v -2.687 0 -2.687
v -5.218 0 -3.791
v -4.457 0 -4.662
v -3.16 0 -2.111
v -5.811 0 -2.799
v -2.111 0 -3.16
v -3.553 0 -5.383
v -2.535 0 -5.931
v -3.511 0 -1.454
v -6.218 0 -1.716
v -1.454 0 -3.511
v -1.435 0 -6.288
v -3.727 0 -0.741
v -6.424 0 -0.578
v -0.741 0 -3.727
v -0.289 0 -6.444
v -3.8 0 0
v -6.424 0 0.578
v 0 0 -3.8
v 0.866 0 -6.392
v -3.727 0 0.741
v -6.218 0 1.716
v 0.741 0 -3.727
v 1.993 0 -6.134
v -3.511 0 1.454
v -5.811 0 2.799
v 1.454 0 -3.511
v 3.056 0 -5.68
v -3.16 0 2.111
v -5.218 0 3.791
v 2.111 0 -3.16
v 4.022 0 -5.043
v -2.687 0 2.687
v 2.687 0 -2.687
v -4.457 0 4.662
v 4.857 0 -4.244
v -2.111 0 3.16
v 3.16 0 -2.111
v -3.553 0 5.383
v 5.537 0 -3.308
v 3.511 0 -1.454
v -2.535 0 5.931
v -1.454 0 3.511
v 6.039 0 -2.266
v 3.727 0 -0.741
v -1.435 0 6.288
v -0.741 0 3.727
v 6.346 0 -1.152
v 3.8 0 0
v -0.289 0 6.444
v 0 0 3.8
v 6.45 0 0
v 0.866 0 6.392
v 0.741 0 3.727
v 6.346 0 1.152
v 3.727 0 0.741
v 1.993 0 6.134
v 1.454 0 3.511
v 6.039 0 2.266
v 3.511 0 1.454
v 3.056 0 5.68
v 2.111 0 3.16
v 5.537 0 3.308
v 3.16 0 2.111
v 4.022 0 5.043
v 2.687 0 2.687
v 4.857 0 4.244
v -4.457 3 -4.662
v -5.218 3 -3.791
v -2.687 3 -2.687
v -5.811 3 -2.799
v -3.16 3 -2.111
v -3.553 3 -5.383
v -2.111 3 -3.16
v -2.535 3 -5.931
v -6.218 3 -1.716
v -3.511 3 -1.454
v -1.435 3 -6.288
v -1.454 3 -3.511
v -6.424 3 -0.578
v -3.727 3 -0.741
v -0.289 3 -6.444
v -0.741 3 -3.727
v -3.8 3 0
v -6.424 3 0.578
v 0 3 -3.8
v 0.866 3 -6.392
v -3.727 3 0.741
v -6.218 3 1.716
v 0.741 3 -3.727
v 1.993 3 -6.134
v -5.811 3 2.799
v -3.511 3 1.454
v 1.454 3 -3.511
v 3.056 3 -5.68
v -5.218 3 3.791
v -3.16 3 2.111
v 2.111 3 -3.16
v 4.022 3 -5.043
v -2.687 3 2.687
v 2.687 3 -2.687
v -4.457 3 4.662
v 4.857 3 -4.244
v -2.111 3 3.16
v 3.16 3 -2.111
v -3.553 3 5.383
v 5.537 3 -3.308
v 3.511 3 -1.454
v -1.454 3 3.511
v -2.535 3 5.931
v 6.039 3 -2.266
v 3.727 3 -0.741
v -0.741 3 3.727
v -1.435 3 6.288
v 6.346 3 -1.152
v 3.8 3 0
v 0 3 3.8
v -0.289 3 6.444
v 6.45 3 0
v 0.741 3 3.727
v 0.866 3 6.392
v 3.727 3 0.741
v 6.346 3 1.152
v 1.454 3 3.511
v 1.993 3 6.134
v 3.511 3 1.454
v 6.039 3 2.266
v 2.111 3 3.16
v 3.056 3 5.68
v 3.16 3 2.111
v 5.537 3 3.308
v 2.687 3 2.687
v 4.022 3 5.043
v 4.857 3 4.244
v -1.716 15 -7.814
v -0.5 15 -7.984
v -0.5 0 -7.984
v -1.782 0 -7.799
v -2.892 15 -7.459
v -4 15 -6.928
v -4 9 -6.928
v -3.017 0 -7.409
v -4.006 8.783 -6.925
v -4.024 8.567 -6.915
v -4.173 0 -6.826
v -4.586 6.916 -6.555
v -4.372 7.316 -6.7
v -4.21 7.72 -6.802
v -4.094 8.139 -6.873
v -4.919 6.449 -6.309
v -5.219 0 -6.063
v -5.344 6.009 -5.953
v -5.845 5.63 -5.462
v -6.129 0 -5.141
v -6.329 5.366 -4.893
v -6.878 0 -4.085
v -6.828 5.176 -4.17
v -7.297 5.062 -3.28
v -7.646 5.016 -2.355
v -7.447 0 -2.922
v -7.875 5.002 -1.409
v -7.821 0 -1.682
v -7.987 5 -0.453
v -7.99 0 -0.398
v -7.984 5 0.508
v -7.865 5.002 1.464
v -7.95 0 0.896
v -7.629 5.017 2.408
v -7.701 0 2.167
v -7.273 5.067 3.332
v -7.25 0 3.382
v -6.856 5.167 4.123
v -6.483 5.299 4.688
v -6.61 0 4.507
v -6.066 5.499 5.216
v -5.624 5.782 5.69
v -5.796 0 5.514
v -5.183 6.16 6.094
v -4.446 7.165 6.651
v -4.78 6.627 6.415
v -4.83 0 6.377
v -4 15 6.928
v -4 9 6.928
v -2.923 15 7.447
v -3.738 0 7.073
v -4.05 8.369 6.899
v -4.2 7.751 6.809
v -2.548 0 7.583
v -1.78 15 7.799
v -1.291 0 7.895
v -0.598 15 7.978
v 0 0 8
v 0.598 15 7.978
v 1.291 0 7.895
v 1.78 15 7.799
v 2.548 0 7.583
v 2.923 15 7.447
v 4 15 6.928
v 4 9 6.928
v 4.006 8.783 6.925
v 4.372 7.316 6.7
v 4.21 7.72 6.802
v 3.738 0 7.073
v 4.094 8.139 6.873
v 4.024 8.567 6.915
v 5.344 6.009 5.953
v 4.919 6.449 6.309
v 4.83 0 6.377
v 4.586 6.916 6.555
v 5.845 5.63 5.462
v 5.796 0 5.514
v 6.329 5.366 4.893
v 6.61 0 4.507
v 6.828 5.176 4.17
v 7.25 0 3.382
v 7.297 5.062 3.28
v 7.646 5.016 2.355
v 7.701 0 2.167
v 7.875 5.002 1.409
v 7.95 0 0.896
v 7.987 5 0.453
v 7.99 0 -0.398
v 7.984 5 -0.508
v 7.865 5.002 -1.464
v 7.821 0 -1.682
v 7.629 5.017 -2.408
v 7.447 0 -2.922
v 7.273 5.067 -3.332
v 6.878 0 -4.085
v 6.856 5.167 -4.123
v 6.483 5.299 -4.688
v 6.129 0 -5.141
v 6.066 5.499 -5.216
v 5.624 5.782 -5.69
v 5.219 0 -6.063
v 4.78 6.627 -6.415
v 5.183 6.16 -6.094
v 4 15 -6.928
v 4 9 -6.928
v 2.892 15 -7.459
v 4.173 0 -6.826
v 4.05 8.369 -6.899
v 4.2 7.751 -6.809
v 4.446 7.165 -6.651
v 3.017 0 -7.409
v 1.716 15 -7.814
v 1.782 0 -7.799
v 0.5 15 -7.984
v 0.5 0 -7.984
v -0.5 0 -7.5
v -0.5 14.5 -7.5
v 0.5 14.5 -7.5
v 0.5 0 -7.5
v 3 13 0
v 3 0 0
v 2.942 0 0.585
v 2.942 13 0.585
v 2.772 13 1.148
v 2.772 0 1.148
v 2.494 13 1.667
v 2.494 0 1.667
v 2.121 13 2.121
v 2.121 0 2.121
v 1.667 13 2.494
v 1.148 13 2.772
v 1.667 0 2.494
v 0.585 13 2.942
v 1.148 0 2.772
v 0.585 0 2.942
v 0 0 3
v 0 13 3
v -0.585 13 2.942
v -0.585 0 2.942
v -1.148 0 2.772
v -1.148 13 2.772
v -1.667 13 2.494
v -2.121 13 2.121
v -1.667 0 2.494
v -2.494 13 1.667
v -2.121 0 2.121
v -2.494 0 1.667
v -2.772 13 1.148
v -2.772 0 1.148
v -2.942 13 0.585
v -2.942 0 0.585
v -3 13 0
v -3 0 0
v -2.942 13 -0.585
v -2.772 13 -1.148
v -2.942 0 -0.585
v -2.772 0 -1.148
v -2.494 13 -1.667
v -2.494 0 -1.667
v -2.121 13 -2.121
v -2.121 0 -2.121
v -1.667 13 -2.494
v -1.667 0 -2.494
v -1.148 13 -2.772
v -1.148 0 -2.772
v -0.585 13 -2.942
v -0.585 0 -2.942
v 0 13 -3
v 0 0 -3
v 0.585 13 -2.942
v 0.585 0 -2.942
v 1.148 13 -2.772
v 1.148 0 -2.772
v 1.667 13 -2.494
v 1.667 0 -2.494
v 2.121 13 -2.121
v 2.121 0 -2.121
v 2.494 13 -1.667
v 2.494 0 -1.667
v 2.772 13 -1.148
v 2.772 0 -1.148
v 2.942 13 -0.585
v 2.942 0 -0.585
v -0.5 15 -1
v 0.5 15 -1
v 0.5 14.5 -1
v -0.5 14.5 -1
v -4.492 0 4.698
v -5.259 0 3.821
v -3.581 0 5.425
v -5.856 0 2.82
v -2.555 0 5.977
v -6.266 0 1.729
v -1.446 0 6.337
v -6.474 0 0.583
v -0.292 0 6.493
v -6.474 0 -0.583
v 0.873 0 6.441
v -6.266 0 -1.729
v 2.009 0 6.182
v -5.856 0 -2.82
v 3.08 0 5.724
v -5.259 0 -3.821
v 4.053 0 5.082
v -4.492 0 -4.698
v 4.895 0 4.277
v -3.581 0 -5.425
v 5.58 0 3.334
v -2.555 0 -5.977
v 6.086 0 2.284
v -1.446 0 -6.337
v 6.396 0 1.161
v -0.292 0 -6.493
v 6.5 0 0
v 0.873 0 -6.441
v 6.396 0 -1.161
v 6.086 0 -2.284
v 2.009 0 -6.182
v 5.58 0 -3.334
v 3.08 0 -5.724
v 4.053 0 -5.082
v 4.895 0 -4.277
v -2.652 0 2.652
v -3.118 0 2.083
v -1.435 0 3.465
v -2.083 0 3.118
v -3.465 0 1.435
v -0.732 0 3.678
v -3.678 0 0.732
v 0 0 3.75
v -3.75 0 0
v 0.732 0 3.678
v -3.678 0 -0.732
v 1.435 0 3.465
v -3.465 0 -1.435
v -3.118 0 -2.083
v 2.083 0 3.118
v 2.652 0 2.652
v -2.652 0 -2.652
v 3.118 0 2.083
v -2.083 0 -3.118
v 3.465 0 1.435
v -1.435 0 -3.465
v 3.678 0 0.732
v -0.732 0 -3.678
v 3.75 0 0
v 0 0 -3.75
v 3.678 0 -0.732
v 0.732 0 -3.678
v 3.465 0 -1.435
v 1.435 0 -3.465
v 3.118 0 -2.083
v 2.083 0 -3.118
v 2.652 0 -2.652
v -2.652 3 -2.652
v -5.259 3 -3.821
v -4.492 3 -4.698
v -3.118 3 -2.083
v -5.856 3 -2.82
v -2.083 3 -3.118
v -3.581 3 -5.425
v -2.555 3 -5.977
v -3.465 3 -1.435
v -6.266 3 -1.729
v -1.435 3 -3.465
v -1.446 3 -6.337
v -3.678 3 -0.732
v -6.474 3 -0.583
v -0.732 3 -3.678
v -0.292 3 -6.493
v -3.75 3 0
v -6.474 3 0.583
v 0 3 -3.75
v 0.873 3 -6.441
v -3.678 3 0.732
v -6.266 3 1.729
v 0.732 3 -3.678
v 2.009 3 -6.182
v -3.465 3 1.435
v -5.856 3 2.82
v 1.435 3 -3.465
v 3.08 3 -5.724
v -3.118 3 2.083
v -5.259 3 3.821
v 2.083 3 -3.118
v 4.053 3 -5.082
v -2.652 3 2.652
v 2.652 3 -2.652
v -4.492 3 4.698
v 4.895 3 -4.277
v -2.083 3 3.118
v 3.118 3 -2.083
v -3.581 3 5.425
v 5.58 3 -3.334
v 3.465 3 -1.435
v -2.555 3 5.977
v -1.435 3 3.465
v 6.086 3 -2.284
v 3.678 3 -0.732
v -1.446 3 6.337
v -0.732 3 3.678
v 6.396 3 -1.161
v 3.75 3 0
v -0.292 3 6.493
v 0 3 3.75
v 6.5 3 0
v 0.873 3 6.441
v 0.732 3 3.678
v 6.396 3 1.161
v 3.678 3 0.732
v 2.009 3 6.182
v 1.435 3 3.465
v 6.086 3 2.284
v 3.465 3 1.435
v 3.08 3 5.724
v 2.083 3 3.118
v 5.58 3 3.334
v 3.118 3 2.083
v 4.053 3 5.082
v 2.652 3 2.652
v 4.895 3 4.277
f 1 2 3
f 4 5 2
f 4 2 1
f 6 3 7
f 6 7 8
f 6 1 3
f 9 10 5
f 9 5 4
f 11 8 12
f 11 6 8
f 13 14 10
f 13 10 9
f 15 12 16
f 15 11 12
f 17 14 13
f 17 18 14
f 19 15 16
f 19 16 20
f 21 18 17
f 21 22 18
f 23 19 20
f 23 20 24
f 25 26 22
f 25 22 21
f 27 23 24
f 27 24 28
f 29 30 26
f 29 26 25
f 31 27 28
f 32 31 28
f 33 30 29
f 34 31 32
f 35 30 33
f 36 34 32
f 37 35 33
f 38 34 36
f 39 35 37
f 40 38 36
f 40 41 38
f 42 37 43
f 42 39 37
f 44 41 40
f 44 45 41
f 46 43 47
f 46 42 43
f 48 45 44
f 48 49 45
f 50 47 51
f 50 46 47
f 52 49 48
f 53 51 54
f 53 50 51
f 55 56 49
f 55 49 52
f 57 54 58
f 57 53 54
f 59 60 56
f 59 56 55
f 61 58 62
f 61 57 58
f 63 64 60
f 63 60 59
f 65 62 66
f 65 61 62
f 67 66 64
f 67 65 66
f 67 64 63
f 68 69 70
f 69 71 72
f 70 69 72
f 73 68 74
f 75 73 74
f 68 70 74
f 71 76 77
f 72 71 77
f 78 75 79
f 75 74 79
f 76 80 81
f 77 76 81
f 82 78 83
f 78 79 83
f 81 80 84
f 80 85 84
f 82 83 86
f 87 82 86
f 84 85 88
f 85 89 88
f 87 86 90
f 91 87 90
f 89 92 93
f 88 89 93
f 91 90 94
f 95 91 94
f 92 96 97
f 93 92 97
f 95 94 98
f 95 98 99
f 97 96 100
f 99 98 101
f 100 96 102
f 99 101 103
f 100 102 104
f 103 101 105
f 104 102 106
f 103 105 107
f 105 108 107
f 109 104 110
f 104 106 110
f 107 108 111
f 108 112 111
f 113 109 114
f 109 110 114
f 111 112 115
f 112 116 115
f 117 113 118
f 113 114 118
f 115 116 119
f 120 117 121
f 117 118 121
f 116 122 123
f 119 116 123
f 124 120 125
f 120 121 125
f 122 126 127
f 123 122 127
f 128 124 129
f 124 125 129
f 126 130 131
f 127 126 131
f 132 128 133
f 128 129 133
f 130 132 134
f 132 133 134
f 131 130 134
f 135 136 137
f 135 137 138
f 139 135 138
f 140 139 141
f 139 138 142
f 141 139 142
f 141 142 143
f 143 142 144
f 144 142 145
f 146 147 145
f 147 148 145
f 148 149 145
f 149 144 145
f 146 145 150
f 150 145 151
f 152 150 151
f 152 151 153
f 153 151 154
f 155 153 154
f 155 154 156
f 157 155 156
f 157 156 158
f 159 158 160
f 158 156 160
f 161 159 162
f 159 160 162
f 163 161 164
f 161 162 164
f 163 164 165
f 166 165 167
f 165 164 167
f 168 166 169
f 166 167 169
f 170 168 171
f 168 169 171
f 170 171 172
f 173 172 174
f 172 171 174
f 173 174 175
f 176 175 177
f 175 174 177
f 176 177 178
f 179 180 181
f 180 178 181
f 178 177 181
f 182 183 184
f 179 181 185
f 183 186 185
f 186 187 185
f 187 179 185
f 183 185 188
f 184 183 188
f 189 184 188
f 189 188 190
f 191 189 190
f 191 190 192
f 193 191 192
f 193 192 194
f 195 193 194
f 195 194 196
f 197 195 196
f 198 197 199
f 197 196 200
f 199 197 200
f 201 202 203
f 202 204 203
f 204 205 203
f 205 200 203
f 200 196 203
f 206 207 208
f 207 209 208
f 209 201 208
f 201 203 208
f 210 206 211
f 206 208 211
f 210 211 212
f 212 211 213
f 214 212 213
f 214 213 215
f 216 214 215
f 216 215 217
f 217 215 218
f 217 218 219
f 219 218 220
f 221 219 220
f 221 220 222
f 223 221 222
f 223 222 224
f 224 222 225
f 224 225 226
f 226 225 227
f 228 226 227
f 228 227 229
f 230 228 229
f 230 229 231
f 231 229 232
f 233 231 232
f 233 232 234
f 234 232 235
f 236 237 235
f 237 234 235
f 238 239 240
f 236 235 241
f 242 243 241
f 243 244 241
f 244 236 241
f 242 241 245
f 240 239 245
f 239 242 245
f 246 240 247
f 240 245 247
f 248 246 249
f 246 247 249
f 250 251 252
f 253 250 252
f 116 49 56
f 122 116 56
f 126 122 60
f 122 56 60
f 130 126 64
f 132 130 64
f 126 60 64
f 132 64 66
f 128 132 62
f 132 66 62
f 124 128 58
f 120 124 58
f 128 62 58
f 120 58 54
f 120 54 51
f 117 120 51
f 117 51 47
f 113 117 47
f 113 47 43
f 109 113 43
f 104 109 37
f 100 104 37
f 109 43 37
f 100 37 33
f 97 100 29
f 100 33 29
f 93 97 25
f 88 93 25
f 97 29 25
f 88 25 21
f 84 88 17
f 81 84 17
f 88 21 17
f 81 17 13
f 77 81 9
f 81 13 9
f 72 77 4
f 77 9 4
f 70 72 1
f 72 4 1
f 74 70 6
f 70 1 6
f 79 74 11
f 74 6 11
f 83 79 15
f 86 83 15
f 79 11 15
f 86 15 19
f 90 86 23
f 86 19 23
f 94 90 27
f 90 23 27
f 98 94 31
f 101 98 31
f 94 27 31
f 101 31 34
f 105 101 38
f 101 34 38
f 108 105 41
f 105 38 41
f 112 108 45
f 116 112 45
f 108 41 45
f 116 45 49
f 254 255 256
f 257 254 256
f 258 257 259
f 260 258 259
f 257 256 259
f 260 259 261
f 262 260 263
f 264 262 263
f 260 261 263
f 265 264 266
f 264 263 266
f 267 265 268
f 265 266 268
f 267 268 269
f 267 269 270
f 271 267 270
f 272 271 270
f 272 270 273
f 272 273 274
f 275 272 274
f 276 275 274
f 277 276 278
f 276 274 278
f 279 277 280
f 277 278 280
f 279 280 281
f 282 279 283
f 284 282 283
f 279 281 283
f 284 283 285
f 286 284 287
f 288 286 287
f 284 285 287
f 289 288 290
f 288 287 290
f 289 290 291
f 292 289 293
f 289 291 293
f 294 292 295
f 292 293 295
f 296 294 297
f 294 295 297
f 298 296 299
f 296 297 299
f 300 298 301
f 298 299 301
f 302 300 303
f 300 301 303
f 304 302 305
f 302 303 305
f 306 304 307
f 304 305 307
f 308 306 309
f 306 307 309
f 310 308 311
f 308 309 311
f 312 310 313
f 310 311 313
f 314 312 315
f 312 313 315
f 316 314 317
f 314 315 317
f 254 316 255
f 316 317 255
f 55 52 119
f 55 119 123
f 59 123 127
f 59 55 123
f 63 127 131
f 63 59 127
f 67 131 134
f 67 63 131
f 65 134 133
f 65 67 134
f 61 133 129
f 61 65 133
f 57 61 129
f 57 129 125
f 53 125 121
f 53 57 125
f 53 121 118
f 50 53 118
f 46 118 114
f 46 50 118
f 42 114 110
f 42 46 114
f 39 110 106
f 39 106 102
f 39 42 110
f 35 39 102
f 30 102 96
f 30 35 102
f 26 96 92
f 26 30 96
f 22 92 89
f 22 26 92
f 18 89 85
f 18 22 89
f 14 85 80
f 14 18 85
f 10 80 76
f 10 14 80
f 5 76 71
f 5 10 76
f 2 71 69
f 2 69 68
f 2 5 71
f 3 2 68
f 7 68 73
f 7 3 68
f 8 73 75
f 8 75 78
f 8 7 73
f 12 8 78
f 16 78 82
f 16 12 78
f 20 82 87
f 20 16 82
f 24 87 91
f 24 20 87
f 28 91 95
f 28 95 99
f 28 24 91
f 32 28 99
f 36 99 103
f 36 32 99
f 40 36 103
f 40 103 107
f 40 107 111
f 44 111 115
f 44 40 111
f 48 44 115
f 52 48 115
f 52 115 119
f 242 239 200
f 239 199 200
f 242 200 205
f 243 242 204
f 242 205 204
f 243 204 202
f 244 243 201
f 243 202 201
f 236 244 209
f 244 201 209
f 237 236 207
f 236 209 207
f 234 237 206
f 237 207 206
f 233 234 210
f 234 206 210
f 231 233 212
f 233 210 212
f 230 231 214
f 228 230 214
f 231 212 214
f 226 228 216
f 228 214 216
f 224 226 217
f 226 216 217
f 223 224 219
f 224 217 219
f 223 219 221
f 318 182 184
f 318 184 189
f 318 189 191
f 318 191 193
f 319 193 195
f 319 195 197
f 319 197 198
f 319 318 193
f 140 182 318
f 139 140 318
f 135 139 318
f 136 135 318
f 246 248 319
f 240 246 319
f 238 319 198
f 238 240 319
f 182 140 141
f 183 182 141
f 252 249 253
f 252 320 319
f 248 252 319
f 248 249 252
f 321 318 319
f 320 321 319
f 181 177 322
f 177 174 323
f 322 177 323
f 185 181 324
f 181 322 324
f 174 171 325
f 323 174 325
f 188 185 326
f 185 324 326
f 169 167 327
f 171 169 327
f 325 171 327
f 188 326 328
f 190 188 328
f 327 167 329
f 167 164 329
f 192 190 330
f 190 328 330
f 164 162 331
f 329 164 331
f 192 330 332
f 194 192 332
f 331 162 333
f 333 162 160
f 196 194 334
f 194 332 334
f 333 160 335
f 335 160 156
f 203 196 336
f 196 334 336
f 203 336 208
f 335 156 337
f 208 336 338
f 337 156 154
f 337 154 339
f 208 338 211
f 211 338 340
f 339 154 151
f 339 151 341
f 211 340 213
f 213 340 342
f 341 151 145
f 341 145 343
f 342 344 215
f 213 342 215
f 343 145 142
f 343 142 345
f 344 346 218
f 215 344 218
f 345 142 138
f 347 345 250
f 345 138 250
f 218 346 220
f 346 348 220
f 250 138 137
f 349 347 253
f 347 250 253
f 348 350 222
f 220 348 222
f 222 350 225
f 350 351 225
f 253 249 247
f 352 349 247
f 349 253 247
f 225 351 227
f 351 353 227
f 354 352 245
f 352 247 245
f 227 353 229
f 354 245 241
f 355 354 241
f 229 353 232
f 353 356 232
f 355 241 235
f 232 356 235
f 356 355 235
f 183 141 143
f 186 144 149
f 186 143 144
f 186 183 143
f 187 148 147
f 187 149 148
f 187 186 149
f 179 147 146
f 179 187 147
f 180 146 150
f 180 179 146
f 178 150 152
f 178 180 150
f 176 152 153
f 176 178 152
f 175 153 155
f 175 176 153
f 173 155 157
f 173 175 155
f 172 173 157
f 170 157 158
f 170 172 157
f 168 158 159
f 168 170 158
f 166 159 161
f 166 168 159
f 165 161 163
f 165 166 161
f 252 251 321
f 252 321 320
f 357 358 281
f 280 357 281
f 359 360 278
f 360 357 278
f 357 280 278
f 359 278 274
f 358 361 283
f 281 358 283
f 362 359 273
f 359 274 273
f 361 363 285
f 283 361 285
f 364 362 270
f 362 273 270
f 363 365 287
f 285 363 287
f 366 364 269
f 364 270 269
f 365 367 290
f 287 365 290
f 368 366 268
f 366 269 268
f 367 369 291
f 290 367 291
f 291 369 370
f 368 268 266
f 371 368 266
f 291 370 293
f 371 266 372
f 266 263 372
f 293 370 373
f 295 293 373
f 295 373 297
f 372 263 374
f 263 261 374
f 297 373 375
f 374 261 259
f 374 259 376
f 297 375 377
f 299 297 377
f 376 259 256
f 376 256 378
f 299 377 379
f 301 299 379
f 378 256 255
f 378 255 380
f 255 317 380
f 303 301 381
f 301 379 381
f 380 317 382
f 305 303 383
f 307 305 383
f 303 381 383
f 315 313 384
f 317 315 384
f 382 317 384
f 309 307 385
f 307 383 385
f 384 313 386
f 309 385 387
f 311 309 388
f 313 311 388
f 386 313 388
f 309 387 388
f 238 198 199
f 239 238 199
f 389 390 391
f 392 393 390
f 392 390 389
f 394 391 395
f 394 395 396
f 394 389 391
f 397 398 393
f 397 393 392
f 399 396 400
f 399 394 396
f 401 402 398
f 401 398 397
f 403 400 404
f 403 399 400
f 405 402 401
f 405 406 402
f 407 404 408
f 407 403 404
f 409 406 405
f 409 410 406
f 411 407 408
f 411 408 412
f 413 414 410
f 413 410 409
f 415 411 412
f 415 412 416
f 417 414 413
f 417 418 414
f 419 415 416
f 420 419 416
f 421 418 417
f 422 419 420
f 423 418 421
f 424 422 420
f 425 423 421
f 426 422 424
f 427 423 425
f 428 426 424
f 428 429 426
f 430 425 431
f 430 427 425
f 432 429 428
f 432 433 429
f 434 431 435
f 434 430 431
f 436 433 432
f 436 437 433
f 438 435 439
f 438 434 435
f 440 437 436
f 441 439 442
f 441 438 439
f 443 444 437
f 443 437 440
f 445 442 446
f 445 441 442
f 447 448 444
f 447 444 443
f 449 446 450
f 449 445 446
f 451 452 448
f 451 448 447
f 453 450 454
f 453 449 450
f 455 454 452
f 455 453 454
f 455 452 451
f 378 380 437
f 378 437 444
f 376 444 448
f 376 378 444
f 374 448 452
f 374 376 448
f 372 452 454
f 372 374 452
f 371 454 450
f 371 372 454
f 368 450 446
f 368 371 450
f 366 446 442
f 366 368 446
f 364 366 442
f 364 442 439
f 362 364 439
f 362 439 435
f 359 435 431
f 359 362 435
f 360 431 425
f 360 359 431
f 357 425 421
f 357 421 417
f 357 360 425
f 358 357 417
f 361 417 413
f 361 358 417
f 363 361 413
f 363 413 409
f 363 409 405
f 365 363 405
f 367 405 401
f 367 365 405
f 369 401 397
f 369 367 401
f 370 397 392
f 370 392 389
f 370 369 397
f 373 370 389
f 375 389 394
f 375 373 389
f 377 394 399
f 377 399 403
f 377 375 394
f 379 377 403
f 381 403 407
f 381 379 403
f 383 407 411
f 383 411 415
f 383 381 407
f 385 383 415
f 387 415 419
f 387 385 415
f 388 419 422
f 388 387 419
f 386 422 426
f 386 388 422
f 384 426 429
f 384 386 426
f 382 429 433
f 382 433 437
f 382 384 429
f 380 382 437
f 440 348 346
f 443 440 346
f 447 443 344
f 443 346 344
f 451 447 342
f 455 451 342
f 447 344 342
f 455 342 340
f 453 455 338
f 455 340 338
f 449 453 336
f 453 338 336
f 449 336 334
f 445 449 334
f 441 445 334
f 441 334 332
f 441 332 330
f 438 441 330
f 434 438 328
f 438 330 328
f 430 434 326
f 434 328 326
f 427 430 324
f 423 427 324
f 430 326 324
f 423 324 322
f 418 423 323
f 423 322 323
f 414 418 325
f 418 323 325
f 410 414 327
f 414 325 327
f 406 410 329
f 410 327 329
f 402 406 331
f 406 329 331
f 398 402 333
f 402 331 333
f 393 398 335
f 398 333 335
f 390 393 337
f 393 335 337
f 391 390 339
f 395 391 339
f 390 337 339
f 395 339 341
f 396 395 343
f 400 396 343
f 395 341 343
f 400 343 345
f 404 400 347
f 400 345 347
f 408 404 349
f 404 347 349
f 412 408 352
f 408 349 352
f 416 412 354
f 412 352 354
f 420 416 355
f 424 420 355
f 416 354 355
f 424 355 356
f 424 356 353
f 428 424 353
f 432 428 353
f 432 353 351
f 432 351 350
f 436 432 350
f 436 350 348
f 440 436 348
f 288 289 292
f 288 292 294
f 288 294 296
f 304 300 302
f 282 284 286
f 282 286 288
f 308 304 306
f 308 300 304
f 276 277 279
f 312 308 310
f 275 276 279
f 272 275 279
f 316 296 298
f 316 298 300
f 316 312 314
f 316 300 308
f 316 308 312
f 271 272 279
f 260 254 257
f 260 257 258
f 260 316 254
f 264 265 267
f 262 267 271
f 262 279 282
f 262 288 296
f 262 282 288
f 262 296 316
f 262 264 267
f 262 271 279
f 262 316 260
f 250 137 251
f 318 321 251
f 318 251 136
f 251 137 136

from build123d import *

# Parameters (mm, degrees)
SKETCH1_R           = 8
BOSS_EXTRUDE1_DEPTH = 15
CUT_EXTRUDE1_DEPTH  = 25
SKETCH3_R           = 3
CUT_EXTRUDE3_DEPTH  = 13
SKETCH3_3_R         = 6.5
SKETCH3_3_R_2       = 3.75
CUT_EXTRUDE4_DEPTH  = 3
SKETCH5_R           = 6.45
SKETCH5_R_2         = 3.8
BOSS_EXTRUDE2_DEPTH = 3
SKETCH6_W           = 1
SKETCH6_H           = 7
CUT_EXTRUDE5_DEPTH  = 0.5
SKETCH7_W           = 1
SKETCH7_H           = 14.5
CUT_EXTRUDE8_DEPTH  = 0.5


with BuildPart() as part:
    # Sketch1 → Boss-Extrude1 (new body)
    with BuildSketch(Plane(origin=(0, 0, 0), x_dir=(1, 0, 0), z_dir=(0, 1, 0))):
        Circle(SKETCH1_R)
    extrude(amount=BOSS_EXTRUDE1_DEPTH)

    # Sketch2 → Cut-Extrude1 (cut)
    with BuildSketch(Plane.XY.offset(10)):
        with BuildLine():
            Line((-4, 15), (-4, 9))
            ThreePointArc((-4, 9), (-5.171572875, 6.171572875), (-8, 5))
            Line((-8, 5), (-8, 15))
            Line((-8, 15), (-4, 15))
        make_face()
        with BuildLine():
            Line((4, 15), (4, 9))
            ThreePointArc((4, 9), (5.171572875, 6.171572875), (8, 5))
            Line((8, 5), (8, 15))
            Line((8, 15), (4, 15))
        make_face()
    extrude(amount=-CUT_EXTRUDE1_DEPTH, mode=Mode.SUBTRACT)

    # Sketch3 → Cut-Extrude3 (cut)
    with BuildSketch(Plane.XZ):
        Circle(SKETCH3_R)
    extrude(amount=-CUT_EXTRUDE3_DEPTH, mode=Mode.SUBTRACT)

    # Sketch3<3> → Cut-Extrude4 (cut)
    with BuildSketch(Plane.XZ):
        Circle(SKETCH3_3_R)
        Circle(SKETCH3_3_R_2, mode=Mode.SUBTRACT)
    extrude(amount=-CUT_EXTRUDE4_DEPTH, mode=Mode.SUBTRACT)

    # Sketch6 → Cut-Extrude5 (cut)
    with BuildSketch(Plane(origin=(0, 15, 0), x_dir=(1, 0, 0), z_dir=(0, 1, 0))):
        with Locations((0, 4.5)):
            Rectangle(SKETCH6_W, SKETCH6_H)
    extrude(amount=-CUT_EXTRUDE5_DEPTH, mode=Mode.SUBTRACT)

    # Sketch7 → Cut-Extrude8 (cut)
    with BuildSketch(Plane.XY.offset(-8)):
        with Locations((0, 7.25)):
            Rectangle(SKETCH7_W, SKETCH7_H)
    extrude(amount=CUT_EXTRUDE8_DEPTH, mode=Mode.SUBTRACT)


with BuildPart() as body_2:
    # Sketch5 → Boss-Extrude2 (new body)
    with BuildSketch(Plane.XZ):
        Circle(SKETCH5_R)
        Circle(SKETCH5_R_2, mode=Mode.SUBTRACT)
    extrude(amount=-BOSS_EXTRUDE2_DEPTH)


solid = Compound([part.part, body_2.part])
